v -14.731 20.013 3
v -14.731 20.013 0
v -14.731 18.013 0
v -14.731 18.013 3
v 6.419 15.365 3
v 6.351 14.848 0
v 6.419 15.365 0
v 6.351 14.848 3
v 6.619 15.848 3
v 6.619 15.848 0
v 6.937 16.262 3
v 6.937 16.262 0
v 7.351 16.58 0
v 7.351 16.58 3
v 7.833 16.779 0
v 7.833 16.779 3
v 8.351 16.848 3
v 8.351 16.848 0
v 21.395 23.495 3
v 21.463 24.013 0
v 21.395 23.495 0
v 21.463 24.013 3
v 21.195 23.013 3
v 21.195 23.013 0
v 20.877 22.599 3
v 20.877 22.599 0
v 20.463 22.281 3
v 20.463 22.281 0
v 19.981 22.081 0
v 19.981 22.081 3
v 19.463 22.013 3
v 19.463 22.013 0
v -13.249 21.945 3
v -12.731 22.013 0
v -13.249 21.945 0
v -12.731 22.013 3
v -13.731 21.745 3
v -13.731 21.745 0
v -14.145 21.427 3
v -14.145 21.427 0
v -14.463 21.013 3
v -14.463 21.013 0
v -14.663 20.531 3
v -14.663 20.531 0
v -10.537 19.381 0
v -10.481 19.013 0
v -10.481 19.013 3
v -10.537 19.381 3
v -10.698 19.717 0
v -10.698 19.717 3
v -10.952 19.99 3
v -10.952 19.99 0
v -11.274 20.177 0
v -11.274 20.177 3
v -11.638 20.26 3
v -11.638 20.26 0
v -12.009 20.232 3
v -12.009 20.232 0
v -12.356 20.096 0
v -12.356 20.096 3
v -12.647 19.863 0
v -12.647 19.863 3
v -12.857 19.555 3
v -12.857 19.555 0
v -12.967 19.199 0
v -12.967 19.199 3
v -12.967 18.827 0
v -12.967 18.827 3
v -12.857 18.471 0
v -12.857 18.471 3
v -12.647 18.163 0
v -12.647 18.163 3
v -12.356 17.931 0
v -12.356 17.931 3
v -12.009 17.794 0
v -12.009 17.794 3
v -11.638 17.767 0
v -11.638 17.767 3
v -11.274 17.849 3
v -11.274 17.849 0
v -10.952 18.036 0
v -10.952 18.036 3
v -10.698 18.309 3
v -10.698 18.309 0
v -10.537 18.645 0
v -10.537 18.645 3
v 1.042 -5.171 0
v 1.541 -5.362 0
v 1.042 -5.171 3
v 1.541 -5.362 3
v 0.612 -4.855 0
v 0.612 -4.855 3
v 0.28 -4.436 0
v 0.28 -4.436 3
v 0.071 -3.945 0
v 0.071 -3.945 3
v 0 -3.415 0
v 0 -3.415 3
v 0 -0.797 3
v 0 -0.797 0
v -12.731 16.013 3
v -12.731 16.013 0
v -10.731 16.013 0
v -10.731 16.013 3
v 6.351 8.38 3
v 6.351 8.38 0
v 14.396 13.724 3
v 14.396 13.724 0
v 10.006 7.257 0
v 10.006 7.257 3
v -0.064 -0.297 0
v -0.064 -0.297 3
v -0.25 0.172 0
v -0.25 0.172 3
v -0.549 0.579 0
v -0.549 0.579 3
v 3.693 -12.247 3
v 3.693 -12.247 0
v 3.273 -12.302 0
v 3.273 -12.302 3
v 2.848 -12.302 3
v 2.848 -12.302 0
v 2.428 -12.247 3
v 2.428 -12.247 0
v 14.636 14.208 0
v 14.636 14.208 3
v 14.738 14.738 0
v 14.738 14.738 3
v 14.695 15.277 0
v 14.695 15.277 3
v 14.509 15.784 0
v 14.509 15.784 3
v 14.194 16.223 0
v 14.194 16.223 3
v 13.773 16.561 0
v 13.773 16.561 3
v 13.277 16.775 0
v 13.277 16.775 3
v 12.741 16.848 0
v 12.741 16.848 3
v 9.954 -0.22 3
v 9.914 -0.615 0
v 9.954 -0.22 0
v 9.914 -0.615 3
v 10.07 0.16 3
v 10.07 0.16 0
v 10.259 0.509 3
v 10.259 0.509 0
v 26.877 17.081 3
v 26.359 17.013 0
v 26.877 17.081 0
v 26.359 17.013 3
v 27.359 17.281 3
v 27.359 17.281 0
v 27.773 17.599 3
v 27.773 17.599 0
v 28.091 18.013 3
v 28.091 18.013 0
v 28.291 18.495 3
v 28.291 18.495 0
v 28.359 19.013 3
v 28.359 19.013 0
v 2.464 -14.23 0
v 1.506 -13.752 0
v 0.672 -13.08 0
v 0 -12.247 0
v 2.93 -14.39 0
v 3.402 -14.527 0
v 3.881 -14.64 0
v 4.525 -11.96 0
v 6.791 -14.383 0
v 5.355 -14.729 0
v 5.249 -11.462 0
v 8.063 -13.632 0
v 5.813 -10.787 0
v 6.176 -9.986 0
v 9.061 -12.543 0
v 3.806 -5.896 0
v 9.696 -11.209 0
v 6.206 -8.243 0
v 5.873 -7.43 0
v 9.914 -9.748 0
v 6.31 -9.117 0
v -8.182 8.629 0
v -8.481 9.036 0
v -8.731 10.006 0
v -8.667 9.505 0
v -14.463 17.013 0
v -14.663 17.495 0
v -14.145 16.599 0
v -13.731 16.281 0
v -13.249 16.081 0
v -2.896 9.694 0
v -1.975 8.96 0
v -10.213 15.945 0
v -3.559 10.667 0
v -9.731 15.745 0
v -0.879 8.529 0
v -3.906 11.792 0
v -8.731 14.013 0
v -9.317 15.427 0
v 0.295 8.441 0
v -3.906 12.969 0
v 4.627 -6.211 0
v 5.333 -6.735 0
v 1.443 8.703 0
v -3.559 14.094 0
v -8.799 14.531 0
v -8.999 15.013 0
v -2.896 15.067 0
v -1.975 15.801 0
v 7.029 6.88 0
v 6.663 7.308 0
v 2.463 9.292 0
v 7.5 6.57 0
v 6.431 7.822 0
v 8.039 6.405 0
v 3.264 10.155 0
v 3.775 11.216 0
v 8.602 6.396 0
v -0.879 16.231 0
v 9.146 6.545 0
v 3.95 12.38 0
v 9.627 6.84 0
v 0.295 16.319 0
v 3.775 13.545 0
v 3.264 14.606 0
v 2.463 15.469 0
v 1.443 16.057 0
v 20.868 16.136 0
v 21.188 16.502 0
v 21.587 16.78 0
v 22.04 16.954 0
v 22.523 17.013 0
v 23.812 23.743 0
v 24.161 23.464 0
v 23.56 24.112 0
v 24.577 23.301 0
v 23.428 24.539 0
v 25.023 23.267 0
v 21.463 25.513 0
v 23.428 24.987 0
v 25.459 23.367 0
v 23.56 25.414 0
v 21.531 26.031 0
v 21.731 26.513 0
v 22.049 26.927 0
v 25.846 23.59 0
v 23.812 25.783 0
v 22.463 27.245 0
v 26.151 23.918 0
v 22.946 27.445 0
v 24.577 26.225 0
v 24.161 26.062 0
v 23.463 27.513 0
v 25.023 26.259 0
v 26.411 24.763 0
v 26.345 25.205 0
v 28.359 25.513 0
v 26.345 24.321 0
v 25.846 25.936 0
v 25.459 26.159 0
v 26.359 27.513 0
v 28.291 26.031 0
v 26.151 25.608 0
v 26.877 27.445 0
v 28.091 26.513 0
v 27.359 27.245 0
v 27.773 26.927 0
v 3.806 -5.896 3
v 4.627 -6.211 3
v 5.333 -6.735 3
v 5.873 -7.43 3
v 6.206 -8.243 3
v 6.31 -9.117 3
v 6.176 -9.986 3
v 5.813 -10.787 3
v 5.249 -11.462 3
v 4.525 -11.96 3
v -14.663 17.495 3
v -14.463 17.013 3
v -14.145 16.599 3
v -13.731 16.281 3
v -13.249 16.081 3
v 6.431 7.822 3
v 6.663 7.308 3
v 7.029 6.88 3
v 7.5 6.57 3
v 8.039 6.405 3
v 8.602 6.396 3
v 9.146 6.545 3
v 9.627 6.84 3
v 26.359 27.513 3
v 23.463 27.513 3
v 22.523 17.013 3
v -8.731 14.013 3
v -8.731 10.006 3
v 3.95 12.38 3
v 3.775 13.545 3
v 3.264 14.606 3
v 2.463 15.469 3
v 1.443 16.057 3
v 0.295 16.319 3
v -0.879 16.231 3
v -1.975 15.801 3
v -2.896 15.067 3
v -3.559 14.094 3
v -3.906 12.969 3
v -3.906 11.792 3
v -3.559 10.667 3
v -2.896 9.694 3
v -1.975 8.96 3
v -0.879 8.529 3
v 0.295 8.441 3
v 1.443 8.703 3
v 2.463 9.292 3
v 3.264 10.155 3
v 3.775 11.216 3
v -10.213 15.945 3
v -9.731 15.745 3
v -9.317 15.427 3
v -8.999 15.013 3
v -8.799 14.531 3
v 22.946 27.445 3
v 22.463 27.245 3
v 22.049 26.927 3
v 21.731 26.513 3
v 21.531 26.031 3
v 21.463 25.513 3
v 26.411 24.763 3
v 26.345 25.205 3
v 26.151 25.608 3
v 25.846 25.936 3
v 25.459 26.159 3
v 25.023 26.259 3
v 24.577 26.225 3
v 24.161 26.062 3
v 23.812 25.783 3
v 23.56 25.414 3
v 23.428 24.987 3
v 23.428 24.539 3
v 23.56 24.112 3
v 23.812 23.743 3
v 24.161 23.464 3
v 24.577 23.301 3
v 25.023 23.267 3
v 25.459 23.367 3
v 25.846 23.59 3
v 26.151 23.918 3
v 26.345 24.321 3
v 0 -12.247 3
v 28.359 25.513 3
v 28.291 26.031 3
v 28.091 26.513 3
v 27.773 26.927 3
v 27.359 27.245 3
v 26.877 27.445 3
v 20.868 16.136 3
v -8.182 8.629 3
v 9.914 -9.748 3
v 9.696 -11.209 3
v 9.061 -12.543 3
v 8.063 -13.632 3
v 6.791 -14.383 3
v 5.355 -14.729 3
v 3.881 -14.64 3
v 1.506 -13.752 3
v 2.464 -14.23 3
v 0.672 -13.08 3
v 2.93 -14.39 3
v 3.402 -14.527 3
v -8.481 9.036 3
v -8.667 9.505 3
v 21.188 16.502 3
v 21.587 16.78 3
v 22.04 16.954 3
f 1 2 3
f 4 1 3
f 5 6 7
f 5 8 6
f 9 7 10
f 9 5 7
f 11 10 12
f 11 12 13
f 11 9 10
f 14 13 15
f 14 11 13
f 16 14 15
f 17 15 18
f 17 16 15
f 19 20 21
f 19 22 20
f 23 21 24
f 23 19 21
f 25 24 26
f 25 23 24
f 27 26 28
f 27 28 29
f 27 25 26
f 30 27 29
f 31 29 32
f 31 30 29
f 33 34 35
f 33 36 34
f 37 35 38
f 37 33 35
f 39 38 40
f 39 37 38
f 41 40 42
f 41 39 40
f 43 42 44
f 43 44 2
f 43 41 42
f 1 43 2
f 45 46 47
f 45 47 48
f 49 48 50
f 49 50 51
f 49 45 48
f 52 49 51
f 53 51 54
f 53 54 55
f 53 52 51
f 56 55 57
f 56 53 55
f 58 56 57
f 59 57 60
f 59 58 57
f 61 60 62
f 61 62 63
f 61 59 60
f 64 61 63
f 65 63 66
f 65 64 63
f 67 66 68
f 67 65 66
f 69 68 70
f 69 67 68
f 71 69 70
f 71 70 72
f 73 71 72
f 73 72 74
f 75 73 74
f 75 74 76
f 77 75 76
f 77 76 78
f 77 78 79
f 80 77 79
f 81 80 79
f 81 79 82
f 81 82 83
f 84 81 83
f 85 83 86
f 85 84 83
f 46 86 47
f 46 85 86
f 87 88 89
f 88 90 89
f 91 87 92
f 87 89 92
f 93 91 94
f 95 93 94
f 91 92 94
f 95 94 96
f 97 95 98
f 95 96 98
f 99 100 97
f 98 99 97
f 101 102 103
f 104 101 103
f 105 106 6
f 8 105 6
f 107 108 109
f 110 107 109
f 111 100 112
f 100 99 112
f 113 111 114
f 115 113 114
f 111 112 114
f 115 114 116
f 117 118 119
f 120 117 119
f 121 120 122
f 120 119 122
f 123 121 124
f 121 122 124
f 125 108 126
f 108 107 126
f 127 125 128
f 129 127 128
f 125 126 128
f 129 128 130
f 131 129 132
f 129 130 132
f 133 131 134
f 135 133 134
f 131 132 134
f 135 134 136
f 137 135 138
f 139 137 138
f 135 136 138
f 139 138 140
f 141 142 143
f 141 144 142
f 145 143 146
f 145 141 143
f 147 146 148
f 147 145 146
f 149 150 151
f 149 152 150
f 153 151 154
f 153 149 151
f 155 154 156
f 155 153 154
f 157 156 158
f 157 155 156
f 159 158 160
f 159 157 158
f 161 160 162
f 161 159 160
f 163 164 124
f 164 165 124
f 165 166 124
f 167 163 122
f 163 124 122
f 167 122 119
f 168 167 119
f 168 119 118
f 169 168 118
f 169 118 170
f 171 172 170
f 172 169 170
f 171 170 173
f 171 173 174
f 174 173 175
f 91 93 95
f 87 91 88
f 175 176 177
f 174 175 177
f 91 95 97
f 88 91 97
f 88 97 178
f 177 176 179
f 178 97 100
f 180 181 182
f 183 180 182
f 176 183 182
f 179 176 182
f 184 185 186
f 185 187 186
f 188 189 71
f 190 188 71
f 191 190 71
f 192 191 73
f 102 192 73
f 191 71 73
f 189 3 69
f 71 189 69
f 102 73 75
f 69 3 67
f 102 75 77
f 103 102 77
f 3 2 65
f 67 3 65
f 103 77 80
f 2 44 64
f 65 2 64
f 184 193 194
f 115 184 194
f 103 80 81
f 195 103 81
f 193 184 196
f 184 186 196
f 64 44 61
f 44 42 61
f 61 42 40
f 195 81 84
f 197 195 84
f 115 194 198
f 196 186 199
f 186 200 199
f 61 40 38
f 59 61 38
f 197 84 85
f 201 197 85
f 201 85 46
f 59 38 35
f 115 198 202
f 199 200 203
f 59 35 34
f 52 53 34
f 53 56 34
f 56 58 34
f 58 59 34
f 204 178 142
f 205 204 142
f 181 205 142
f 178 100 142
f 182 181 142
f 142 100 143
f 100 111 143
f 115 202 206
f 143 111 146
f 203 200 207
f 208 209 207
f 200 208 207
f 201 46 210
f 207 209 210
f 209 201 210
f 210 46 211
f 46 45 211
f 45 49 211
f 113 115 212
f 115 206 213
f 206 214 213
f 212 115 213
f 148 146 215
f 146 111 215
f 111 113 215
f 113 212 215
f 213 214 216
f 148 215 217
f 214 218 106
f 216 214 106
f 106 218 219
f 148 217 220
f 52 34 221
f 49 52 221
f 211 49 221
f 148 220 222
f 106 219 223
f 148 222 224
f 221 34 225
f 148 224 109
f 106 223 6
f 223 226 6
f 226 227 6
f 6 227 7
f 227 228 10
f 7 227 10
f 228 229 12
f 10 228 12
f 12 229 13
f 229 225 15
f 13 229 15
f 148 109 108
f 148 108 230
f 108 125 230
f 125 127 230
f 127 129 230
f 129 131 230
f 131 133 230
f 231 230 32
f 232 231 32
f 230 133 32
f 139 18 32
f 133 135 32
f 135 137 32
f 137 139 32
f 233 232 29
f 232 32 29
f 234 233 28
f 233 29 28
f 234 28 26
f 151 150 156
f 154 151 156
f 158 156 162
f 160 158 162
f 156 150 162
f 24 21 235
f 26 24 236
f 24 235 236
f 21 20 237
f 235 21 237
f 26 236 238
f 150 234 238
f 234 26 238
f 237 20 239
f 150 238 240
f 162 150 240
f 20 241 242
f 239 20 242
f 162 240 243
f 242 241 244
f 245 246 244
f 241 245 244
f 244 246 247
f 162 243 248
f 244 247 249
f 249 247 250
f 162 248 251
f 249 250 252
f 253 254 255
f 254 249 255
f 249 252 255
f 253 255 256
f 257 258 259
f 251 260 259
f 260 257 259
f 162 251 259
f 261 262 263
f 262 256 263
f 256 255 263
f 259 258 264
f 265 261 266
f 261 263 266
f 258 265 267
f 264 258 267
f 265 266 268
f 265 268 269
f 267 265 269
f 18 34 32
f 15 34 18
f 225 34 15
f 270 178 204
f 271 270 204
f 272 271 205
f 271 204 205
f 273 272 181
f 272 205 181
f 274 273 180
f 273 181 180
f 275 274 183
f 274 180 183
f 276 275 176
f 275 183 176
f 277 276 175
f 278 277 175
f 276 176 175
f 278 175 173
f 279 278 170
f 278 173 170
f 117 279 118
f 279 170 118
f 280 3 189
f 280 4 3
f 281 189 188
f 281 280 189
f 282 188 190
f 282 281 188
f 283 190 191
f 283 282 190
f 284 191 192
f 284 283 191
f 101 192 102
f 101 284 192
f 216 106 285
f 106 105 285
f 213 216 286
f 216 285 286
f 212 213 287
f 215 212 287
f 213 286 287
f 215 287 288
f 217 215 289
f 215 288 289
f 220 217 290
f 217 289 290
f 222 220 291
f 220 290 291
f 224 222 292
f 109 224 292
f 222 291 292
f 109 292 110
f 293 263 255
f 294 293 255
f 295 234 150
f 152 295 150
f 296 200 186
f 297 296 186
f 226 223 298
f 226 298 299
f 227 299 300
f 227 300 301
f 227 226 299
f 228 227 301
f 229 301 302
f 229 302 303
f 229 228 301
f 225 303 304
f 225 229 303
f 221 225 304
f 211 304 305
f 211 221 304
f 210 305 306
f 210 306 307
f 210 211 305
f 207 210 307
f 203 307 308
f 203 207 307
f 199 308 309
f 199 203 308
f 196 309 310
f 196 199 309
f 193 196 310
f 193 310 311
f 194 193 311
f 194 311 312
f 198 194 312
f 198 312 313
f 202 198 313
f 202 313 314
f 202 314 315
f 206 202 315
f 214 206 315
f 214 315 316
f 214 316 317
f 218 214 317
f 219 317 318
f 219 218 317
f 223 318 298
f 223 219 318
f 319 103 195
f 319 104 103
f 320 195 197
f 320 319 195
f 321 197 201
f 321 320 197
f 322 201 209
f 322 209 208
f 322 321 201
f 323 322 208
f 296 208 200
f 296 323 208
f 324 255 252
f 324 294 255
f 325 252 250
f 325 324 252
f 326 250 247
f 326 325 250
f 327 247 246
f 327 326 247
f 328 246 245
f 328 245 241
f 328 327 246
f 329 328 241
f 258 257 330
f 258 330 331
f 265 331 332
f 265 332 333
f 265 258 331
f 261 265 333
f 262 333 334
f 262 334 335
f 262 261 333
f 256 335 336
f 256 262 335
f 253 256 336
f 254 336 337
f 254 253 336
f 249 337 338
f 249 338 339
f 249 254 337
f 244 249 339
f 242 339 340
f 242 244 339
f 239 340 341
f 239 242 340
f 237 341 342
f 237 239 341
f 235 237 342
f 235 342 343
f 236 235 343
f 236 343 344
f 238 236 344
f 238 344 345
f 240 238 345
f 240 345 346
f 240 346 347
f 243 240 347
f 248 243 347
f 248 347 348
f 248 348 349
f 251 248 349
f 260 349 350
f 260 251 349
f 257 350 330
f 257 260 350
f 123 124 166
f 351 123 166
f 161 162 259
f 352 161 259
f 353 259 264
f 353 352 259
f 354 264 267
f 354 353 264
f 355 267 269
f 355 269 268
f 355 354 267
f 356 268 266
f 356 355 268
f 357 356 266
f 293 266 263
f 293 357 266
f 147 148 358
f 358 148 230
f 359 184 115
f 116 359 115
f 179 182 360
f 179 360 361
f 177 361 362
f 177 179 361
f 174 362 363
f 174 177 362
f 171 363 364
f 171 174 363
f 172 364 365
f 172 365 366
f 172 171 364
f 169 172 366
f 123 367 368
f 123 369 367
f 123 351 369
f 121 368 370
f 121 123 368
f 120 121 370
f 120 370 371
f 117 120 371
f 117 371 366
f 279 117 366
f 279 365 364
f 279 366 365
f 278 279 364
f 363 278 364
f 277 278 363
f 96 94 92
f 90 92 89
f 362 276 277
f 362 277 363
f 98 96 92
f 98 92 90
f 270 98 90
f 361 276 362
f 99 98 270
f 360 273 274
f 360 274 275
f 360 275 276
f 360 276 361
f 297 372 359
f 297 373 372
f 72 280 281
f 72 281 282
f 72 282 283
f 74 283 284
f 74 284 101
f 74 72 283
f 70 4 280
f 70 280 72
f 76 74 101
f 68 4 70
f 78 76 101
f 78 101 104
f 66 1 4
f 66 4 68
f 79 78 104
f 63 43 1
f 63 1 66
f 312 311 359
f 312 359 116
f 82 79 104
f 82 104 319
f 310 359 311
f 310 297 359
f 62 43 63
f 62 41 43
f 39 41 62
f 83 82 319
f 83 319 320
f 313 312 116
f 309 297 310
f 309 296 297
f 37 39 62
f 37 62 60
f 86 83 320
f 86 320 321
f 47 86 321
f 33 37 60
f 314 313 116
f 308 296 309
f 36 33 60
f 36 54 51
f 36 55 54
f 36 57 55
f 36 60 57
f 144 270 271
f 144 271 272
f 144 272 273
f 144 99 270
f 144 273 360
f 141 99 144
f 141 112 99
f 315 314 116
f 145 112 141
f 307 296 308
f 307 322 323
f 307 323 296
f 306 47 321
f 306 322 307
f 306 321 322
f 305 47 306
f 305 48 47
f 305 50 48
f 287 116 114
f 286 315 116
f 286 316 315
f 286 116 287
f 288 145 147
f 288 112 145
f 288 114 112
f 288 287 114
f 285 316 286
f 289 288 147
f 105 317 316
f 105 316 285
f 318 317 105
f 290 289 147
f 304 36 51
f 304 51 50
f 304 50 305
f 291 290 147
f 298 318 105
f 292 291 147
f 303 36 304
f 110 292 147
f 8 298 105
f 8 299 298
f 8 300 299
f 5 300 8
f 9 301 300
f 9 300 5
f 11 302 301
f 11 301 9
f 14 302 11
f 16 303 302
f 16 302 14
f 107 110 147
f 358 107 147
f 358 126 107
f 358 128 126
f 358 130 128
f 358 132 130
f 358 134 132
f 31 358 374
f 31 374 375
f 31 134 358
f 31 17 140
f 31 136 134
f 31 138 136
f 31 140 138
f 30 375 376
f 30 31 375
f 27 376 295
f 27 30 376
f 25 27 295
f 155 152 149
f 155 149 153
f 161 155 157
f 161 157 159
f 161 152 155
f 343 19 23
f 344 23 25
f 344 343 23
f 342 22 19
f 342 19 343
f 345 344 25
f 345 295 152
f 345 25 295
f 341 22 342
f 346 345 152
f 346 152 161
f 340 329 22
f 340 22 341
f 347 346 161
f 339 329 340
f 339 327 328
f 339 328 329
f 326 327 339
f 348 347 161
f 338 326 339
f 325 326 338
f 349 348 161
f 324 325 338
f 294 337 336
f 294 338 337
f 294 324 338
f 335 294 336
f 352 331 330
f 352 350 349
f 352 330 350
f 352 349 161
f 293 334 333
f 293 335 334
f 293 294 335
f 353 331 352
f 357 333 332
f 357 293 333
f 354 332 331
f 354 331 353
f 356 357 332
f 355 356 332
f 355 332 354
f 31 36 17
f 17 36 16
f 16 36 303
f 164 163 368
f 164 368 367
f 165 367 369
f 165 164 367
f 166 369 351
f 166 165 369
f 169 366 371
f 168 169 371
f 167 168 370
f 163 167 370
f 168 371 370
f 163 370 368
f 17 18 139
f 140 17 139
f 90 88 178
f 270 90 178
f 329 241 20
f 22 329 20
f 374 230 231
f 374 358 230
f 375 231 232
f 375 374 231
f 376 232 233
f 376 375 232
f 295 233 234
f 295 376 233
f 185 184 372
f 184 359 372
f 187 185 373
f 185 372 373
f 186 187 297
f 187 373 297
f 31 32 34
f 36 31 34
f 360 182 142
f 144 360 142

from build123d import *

# Parameters (mm, degrees)
F0_R        = 3.95
F0_R_2      = 1.25
F0_R_3      = 1.5
F1_DEPTH    = 3
F2_R        = 10
F3_R        = 2
F4_T1_DEPTH = 16.2671931878
F4_T3_DEPTH = 33.1863063341


# Not quite as in the source:
# - a fillet or chamfer that OpenCascade refuses, or shapes differently, is made with other operations: its cross-section is extruded or revolved along the edge and cut away or added
# - a feature names something its author has since deleted; it is built from what else it names


with BuildPart() as f1:
    # F0 (on Top) → F1 (new body)
    with BuildSketch(Plane.XY):
        with BuildLine():
            Line((4.0200765709, -14.8563961814), (9.9142113018, -14.8563961814))
            Line((9.9142113018, -14.8563961814), (9.9142113018, -11.4412054596))
            Line((9.9142113018, -11.4412054596), (9.9142113018, 0))
            Line((9.9142113018, 0), (21.4632351379, 17.0130324811))
            Line((21.4632351379, 17.0130324811), (28.3592351379, 17.0130324811))
            Line((28.3592351379, 17.0130324811), (28.3592351379, 22.0130324811))
            Line((28.3592351379, 22.0130324811), (28.3592351379, 27.5130324811))
            Line((28.3592351379, 27.5130324811), (21.4632351379, 27.5130324811))
            Line((21.4632351379, 27.5130324811), (21.4632351379, 22.0130324811))
            Line((21.4632351379, 22.0130324811), (-8.7310690433, 22.0130324811))
            Line((-8.7310690433, 22.0130324811), (-14.7310690433, 22.0130324811))
            Line((-14.7310690433, 22.0130324811), (-14.7310690433, 16.0130324811))
            Line((-14.7310690433, 16.0130324811), (-8.7310690433, 16.0130324811))
            Line((-8.7310690433, 16.0130324811), (-8.7310690433, 9.2081045732))
            Line((-8.7310690433, 9.2081045732), (0, 0))
            Line((0, 0), (0, -4.9987894588))
            Line((0, -4.9987894588), (3.805913418, -5.8956493604))
            ThreePointArc((3.805913418, -5.8956493604), (6.3099596188, -9.1166975853), (3.693151613, -12.2468277588))
            ThreePointArc((3.693151613, -12.2468277588), (3.0604717322, -12.3090046508), (2.4277918514, -12.2468277588))
            Line((2.4277918514, -12.2468277588), (0, -12.2468277588))
            Line((0, -12.2468277588), (0, -13.2468277588))
            Line((0, -13.2468277588), (4.0200765709, -14.8563961814))
        make_face()
        with Locations((0, 12.3804118484)):
            Circle(F0_R, mode=Mode.SUBTRACT)
        with Locations((-11.7310690433, 19.0130324811)):
            Circle(F0_R_2, mode=Mode.SUBTRACT)
        Polygon((6.3511028036, 16.8475485612), (16.5163309854, 16.8475485612), (6.3511028036, 1.8730052848), align=None, mode=Mode.SUBTRACT)
        with Locations((24.9112351379, 24.7630324811)):
            Circle(F0_R_3, mode=Mode.SUBTRACT)
    extrude(amount=F1_DEPTH)

    # F2
    f2_edges = [f1.edges().sort_by_distance(p)[0] for p in [
        (4.020077, -14.856396, 1.5),
    ]]
    fillet(f2_edges, radius=F2_R)

    # F3
    f3_edges = [f1.edges().sort_by_distance(p)[0] for p in [
        (21.463235, 22.013032, 1.5),
        (-8.731069, 9.208105, 1.5),
        (21.463235, 17.013032, 1.5),
        (0, 0, 1.5),
        (0, -4.998789, 1.5),
        (9.914211, 0, 1.5),
        (6.351103, 16.847549, 1.5),
        (16.516331, 16.847549, 1.5),
        (6.351103, 1.873005, 1.5),
        (-14.731069, 16.013032, 1.5),
        (-14.731069, 22.013032, 1.5),
        (28.359235, 27.513032, 1.5),
        (21.463235, 27.513032, 1.5),
        (28.359235, 17.013032, 1.5),
        (-8.731069, 16.013032, 1.5),
    ]]
    fillet(f3_edges, radius=F3_R)

    # F4: fillet of radius 5 on 2 edges, made by hand

    # F4_s2 → F4_t1 (cut)
    with BuildSketch(Plane.XY.offset(-6.6335965939)):
        with BuildLine():
            ThreePointArc((2.4644968667, -14.2301851696), (1.0712579431, -13.4385513762), (0, -12.2468277588))
            Line((0, -12.2468277588), (-0.4206053642, -12.5171814672))
            ThreePointArc((-0.4206053642, -12.5171814672), (-0.5, -12.7468277588), (-0.5, -13.2468277588))
            Line((-0.5, -13.2468277588), (-0.1858483979, -13.7110048511))
            ThreePointArc((-0.1858483979, -13.7110048511), (2.0447940609, -14.6041151192), (2.2903411892, -14.698874619))
            Line((2.2903411892, -14.698874619), (2.4644968667, -14.2301851696))
        make_face()
    extrude(amount=F4_T1_DEPTH, mode=Mode.SUBTRACT)

    # F4_s4 → F4_t3 (cut)
    with BuildSketch(Plane.XY.offset(-15.0931531671)):
        with BuildLine():
            ThreePointArc((9.9142113018, -9.7484393403), (8.063259128, -13.6321872452), (3.8808121864, -14.6404824992))
            Line((3.8808121864, -14.6404824992), (3.7774722749, -15.1296868151))
            ThreePointArc((3.7774722749, -15.1296868151), (5.9476104172, -15.3563961814), (9.9142113018, -15.3563961814))
            Line((9.9142113018, -15.3563961814), (10.4142113018, -14.8563961814))
            Line((10.4142113018, -14.8563961814), (10.4142113018, -9.7484393403))
            Line((10.4142113018, -9.7484393403), (9.9142113018, -9.7484393403))
        make_face()
    extrude(amount=F4_T3_DEPTH, mode=Mode.SUBTRACT)


solid = f1.part
